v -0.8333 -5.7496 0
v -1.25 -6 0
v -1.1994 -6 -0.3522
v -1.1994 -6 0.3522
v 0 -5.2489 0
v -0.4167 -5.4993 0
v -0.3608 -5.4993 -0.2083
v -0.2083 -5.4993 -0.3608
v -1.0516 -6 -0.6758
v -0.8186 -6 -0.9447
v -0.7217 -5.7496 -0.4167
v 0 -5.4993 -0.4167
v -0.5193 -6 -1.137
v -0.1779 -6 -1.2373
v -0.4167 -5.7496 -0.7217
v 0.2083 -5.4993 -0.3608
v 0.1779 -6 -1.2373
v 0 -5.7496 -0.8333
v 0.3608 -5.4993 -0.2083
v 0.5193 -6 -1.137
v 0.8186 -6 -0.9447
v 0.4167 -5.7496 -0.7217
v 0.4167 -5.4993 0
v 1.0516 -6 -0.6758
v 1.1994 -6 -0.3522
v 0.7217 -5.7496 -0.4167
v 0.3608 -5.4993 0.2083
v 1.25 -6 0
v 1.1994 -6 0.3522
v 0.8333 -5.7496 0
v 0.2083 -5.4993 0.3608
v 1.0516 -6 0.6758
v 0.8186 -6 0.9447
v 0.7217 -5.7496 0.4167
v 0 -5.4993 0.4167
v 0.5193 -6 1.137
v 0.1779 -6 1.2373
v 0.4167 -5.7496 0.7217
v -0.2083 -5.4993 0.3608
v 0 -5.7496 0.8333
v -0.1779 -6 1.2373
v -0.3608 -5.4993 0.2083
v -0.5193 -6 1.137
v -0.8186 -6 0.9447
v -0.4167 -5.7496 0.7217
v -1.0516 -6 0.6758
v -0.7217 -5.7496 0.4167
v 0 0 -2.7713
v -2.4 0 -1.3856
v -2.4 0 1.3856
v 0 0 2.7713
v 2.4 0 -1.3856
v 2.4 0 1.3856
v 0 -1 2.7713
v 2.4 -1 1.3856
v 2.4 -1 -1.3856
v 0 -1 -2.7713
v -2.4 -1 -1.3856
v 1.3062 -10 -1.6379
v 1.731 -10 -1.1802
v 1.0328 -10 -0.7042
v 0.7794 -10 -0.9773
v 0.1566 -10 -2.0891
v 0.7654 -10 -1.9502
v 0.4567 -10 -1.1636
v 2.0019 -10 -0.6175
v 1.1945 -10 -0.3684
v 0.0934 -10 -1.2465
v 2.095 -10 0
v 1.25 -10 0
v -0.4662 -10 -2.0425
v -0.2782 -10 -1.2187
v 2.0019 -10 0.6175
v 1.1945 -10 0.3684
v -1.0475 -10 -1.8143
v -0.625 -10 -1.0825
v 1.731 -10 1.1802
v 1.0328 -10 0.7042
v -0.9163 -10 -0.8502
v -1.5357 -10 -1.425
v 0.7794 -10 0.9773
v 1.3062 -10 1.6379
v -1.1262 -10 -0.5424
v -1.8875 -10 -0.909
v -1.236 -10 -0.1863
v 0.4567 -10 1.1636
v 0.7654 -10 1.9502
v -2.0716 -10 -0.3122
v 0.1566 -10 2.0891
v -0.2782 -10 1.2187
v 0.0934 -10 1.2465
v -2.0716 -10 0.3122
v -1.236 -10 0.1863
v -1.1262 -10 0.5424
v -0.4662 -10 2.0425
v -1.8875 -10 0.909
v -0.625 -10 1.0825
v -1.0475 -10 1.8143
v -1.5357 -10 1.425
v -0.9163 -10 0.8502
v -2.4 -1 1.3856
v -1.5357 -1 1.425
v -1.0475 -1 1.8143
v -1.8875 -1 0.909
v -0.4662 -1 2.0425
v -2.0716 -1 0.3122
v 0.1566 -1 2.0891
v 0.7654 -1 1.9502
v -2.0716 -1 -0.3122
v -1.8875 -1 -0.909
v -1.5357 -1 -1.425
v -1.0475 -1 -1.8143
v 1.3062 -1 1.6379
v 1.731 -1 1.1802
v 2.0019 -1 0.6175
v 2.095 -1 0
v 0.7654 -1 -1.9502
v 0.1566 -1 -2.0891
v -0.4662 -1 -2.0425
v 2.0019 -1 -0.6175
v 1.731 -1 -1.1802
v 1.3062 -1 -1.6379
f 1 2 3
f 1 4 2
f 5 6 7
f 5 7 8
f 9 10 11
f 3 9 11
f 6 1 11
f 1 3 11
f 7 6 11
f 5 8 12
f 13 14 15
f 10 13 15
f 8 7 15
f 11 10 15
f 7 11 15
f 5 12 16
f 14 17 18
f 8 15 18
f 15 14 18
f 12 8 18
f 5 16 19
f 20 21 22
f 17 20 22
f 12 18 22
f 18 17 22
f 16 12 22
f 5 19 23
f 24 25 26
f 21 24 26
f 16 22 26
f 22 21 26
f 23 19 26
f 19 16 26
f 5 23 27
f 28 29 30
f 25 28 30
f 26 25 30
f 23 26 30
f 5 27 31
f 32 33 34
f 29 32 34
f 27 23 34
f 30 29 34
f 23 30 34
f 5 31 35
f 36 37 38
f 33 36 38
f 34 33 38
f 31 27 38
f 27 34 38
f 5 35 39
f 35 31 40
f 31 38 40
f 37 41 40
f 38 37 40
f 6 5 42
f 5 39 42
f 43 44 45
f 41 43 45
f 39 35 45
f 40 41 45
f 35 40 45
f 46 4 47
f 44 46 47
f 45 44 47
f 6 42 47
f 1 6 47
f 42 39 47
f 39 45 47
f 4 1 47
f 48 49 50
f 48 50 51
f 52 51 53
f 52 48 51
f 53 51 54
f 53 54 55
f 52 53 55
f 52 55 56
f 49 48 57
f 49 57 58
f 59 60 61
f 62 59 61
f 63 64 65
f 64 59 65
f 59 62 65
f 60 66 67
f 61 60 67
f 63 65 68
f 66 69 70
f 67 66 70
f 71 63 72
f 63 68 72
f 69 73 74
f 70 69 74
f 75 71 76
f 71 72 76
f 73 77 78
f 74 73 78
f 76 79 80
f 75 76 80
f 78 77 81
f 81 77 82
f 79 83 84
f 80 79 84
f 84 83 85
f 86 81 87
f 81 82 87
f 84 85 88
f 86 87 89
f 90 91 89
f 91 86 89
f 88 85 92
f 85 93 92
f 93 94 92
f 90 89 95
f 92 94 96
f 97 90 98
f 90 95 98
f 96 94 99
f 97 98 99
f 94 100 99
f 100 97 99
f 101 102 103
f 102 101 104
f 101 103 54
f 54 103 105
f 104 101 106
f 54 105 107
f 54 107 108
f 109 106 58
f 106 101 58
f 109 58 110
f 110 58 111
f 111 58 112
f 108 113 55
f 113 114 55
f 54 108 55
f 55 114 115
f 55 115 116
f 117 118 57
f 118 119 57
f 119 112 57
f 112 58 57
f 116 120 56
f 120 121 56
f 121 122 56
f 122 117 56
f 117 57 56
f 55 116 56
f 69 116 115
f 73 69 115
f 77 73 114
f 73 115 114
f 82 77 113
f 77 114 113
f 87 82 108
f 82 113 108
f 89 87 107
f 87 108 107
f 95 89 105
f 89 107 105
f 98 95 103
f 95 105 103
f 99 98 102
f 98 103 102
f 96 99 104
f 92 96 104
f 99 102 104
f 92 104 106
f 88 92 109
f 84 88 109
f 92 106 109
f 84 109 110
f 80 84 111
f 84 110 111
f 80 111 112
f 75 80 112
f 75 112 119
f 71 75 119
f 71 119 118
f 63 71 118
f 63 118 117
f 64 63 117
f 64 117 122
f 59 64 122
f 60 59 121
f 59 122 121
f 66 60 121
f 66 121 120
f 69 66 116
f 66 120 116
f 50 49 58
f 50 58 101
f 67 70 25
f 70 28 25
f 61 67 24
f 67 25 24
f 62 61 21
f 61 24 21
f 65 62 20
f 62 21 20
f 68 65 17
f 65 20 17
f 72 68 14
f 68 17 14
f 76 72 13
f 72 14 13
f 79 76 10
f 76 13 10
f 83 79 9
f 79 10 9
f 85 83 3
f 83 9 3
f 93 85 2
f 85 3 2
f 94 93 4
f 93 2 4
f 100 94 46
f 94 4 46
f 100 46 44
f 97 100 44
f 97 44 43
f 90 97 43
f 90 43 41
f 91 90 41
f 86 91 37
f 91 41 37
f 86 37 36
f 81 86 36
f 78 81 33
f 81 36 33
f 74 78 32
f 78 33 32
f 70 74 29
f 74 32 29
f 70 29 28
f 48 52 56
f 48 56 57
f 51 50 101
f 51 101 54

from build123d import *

# Parameters (mm, degrees)
CROQUIS1_W                = 2.095
CROQUIS1_H                = 10
SALIENTE_EXTRUIR1_DEPTH   = 1
TALADRO_ROSCADO_M31_D     = 2.5
TALADRO_ROSCADO_M31_DEPTH = 4
TALADRO_ROSCADO_M31_TIP   = 0.751075774


with BuildPart() as part:
    # Croquis1 → Revolución1 (revolve)
    with BuildSketch(Plane.XY):
        with Locations((1.0475, -5)):
            Rectangle(CROQUIS1_W, CROQUIS1_H)
    revolve(axis=Axis((0, 0, 0), (0, -1, 0)))

    # Croquis2 → Saliente-Extruir1 (add)
    with BuildSketch(Plane(origin=(0, 0, 0), x_dir=(1, 0, 0), z_dir=(0, 1, 0))):
        Polygon((2.4, -1.385640646), (2.4, 1.385640646), (0, 2.771281292), (-2.4, 1.385640646), (-2.4, -1.385640646), (0, -2.771281292), align=None)
    extrude(amount=-SALIENTE_EXTRUIR1_DEPTH)

    # Taladro roscado M31
    with Locations(Plane(origin=(0, -10, 0), x_dir=(-1, 0, 0), z_dir=(0, -1, 0))):
        with Locations((0, 0)):
            Hole(TALADRO_ROSCADO_M31_D / 2, depth=TALADRO_ROSCADO_M31_DEPTH)
            with Locations((0, 0, -(TALADRO_ROSCADO_M31_DEPTH + TALADRO_ROSCADO_M31_TIP / 2))):  # 118° drill point
                Cone(0, TALADRO_ROSCADO_M31_D / 2, TALADRO_ROSCADO_M31_TIP, mode=Mode.SUBTRACT)


solid = part.part
